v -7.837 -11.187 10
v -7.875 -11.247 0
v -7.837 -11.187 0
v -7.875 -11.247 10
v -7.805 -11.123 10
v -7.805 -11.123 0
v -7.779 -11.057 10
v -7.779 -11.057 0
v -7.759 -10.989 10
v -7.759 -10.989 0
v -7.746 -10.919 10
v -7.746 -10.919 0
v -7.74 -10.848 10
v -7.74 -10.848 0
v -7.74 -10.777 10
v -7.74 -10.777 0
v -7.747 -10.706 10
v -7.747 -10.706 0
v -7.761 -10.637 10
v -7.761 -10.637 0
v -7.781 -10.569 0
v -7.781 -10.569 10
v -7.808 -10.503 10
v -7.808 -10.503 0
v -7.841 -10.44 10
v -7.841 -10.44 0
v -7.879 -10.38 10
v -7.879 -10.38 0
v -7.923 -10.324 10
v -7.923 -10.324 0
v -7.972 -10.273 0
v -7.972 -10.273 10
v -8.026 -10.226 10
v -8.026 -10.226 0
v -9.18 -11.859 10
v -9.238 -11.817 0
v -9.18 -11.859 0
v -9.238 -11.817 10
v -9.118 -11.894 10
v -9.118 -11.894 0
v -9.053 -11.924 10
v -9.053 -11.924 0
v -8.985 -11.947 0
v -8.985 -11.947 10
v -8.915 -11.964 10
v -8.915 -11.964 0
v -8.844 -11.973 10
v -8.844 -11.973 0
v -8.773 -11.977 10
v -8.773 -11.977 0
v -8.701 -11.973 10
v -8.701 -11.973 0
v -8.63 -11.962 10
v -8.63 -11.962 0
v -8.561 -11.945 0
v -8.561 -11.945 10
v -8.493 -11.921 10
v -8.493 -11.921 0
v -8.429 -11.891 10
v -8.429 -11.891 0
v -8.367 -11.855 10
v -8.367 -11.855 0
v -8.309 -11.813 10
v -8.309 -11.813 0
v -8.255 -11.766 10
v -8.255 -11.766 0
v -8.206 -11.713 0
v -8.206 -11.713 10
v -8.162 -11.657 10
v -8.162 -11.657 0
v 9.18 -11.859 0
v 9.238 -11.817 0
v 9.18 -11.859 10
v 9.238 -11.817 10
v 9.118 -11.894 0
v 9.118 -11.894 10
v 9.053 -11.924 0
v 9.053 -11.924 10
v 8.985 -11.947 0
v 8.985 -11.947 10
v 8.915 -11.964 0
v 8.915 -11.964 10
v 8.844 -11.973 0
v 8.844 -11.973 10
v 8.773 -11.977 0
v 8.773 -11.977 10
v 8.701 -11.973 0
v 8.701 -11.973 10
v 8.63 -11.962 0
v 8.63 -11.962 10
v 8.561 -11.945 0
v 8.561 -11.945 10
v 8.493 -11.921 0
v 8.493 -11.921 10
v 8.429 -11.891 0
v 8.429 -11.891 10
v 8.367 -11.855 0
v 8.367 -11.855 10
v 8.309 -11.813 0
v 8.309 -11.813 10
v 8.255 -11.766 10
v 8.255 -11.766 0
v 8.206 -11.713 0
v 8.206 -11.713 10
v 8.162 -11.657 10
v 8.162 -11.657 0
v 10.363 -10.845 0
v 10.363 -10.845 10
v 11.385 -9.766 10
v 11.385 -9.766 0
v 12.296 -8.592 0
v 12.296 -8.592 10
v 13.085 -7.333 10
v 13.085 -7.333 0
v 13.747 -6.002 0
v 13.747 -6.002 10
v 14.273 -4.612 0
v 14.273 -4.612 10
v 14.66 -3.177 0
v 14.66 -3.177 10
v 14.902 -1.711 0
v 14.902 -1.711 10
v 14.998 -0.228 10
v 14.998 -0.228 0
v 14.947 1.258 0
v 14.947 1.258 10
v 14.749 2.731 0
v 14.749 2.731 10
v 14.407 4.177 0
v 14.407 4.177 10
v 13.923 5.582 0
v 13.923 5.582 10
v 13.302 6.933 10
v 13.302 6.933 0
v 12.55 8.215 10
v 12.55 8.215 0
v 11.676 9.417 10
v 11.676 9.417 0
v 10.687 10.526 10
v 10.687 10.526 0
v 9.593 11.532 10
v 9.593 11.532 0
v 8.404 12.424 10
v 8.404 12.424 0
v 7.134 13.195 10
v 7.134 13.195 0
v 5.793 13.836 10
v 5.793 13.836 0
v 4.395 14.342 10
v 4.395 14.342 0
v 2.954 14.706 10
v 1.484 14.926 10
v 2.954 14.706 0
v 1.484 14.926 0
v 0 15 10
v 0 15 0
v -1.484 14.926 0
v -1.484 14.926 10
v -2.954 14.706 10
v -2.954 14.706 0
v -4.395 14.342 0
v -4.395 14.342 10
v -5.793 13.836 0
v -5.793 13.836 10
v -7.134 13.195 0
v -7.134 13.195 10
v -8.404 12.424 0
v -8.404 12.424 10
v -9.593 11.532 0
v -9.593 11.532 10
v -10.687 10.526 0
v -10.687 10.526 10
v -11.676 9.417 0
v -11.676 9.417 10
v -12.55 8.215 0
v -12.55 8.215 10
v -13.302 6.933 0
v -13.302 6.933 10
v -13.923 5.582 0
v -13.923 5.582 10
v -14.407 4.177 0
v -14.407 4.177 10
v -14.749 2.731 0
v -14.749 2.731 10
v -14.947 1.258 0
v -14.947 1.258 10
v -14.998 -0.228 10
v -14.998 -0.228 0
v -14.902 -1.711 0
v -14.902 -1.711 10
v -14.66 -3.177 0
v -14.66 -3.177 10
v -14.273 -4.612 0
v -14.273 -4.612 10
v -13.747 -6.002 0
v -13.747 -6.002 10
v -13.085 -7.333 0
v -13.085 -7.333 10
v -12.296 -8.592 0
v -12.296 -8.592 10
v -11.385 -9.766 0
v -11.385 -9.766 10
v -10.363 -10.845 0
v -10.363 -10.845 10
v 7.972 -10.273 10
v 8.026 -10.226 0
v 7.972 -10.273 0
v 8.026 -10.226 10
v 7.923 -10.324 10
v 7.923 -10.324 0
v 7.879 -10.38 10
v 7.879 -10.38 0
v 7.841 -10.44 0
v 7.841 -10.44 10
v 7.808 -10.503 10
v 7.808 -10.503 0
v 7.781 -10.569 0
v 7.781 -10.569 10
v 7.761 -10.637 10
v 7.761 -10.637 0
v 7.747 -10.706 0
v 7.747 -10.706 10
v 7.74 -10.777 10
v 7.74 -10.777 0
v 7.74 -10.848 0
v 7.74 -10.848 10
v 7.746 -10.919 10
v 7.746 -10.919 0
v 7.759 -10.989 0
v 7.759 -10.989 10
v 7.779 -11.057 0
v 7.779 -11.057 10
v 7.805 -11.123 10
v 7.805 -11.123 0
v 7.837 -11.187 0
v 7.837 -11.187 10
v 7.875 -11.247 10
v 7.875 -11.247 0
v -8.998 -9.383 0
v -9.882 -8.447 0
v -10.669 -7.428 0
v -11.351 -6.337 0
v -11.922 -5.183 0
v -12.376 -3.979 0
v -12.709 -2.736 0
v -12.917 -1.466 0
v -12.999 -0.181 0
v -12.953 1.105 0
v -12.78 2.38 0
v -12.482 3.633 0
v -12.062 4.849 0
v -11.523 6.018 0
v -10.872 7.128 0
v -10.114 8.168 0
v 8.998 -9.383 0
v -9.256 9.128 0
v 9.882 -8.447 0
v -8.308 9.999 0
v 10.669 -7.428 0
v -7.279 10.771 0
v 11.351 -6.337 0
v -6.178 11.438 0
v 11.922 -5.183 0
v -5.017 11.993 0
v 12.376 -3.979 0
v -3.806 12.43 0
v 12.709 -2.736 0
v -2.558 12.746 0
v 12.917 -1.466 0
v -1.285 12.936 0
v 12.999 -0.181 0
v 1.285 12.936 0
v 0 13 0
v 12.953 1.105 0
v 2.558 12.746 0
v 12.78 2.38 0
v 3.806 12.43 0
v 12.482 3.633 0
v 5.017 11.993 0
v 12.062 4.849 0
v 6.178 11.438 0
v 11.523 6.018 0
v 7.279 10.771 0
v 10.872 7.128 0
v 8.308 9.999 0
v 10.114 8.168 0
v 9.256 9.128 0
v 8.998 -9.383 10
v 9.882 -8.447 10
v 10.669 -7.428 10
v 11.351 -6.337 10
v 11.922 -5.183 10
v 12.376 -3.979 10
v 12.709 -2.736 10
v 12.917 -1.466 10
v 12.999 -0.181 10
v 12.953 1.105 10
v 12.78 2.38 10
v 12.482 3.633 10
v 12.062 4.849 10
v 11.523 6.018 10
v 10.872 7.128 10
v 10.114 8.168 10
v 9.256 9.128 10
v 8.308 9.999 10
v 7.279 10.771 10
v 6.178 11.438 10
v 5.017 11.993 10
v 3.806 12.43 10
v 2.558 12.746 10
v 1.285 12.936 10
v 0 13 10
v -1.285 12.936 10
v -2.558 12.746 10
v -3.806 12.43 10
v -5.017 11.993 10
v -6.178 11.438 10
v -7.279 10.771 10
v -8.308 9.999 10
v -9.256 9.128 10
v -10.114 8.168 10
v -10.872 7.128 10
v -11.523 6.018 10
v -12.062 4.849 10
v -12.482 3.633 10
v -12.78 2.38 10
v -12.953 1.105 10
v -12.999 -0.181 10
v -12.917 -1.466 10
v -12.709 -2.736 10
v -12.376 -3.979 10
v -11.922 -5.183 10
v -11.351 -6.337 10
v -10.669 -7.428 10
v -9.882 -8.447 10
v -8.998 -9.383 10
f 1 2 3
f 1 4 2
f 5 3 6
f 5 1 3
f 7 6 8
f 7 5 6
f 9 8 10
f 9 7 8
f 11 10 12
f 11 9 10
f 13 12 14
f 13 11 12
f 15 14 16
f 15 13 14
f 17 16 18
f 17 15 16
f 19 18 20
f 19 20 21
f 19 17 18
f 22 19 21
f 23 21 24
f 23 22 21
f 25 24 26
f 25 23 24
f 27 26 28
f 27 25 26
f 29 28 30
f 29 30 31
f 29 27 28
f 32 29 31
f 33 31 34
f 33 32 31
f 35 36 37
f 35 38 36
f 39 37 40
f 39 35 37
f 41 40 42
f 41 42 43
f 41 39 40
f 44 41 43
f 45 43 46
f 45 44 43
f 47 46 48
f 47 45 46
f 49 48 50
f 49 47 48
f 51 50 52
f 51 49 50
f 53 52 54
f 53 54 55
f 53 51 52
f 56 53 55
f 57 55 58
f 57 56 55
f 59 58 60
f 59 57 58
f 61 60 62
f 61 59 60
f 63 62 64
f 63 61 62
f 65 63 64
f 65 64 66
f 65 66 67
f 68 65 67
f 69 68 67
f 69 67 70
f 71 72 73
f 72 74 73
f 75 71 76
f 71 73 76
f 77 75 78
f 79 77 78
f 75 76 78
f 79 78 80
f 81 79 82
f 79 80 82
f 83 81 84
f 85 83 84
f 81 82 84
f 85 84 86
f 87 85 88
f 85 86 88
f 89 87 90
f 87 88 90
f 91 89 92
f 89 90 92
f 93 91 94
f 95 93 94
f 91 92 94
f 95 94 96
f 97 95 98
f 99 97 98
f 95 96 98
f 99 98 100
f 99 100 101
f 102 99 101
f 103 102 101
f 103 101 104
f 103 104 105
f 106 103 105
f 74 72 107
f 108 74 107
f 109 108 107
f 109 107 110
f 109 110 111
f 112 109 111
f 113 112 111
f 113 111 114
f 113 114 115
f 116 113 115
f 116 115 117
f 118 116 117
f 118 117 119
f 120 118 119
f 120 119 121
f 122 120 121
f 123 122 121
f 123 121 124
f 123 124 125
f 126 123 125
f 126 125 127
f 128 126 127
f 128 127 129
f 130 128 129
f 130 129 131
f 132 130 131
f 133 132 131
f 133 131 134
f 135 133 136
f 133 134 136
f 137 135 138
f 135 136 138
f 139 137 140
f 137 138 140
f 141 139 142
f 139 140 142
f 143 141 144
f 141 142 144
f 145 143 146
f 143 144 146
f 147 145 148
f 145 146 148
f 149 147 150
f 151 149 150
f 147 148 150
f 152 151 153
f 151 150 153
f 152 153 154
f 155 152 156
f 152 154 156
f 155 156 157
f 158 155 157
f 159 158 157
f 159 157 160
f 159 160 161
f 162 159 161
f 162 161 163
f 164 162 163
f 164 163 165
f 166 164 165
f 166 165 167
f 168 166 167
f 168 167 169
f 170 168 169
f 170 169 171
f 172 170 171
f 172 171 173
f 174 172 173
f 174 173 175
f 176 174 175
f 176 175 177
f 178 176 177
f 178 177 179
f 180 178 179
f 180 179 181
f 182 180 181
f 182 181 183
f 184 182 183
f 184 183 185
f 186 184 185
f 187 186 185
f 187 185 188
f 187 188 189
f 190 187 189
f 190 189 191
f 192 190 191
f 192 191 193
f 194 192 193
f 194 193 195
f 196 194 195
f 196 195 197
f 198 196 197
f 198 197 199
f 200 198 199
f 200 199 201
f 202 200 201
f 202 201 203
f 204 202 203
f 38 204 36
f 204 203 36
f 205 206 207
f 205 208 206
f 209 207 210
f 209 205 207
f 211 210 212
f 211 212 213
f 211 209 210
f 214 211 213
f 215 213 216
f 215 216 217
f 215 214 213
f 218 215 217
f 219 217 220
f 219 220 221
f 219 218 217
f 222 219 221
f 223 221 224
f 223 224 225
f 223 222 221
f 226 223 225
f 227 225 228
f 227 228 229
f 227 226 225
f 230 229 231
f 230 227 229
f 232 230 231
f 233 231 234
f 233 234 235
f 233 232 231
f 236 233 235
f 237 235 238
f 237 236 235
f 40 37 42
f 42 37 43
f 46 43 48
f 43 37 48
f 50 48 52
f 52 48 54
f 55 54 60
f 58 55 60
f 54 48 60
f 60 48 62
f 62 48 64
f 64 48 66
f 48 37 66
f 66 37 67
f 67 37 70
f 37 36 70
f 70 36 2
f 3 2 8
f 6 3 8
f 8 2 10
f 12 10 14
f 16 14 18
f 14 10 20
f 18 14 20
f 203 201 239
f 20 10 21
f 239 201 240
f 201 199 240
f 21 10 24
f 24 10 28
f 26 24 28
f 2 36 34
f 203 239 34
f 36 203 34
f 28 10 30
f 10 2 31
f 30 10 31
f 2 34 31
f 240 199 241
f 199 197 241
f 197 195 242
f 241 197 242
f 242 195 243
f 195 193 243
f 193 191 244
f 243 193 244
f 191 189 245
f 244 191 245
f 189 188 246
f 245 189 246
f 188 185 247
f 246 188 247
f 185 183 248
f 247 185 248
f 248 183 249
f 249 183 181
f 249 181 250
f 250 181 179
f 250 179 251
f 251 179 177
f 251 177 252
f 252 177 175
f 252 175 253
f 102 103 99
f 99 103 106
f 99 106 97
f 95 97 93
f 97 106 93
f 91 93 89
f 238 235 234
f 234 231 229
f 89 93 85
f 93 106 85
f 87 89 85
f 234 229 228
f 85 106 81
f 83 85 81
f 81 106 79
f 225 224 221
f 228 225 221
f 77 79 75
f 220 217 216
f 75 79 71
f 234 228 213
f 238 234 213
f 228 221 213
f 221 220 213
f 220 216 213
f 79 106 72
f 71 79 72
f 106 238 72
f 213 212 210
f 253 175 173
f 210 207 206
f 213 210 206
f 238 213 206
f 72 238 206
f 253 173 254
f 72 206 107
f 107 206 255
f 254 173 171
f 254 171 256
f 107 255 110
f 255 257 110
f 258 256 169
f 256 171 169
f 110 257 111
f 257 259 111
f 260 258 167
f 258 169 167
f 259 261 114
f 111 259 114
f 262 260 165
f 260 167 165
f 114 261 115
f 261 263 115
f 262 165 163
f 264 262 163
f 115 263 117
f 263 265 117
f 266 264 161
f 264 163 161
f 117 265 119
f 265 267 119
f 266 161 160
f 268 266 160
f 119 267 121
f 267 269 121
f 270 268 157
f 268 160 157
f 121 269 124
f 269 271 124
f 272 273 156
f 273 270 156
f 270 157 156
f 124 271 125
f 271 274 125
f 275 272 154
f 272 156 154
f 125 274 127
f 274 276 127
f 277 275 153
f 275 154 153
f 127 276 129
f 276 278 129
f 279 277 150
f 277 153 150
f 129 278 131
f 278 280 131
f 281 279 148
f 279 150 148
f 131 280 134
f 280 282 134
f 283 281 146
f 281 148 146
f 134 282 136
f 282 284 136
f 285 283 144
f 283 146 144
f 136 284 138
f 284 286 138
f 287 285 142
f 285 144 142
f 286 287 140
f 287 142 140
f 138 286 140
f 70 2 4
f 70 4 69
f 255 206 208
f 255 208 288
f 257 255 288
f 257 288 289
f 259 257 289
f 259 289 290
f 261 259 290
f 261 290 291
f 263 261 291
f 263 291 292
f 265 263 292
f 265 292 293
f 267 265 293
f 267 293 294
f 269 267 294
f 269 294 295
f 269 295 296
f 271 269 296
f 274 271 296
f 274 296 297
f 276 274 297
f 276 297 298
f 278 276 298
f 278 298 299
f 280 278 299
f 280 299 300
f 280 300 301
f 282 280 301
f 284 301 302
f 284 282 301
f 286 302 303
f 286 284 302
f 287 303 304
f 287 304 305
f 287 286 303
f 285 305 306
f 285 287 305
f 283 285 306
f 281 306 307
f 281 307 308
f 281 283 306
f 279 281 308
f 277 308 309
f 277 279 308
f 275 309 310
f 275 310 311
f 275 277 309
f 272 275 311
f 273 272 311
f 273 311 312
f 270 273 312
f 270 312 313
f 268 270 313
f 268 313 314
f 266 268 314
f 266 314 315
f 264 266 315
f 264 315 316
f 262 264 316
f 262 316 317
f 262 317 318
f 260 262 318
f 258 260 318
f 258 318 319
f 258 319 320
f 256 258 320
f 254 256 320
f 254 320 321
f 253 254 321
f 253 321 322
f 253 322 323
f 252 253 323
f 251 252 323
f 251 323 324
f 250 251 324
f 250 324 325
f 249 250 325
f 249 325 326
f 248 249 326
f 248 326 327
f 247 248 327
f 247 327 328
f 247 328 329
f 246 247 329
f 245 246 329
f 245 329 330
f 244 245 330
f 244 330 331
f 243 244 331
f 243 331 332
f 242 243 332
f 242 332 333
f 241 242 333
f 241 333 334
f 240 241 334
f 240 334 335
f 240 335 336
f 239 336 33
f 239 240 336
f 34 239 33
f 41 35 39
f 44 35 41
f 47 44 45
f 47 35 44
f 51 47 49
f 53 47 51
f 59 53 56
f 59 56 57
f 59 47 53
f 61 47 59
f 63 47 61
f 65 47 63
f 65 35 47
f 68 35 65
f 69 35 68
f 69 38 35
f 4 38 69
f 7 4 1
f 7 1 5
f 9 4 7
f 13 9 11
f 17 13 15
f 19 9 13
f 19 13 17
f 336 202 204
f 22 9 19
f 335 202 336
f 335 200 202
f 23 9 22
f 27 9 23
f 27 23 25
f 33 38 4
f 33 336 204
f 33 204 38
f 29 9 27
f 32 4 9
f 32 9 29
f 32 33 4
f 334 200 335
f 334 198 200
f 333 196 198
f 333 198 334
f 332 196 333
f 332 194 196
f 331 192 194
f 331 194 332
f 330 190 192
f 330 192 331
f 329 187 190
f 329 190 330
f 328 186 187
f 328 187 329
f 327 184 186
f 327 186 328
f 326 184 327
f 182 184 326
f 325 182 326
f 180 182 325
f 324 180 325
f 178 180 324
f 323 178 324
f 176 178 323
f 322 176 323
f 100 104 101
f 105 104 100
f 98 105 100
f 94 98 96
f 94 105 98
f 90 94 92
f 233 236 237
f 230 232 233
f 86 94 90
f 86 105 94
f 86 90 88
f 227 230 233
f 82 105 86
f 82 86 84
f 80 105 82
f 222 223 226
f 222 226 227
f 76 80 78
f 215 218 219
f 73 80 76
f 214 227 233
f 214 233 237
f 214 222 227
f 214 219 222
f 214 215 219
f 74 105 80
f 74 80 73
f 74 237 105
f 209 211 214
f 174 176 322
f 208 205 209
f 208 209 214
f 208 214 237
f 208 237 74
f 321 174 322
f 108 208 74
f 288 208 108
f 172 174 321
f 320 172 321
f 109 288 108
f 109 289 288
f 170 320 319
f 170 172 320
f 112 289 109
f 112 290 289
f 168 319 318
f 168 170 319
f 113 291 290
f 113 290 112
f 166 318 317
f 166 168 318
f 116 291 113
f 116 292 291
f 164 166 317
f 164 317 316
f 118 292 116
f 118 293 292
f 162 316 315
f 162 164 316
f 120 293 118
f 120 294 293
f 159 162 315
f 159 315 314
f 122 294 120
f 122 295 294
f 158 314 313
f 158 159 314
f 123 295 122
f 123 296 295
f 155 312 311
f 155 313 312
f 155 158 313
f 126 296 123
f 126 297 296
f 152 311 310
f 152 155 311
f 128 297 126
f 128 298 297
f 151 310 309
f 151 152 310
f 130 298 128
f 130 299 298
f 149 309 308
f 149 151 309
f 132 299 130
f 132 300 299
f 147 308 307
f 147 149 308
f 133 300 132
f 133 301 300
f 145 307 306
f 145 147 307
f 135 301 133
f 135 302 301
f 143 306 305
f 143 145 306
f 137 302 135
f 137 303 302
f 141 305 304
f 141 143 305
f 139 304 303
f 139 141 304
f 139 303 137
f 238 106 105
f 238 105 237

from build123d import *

# Parameters (mm, degrees)
PAD_DEPTH = 10
FILLET_R  = 0.75


with BuildPart() as part:
    # Sketch → Pad (new body)
    with BuildSketch(Plane.XY):
        with BuildLine():
            ThreePointArc((8.603647, -12.287281), (0, 15), (-8.603647, -12.287281))
            Line((-7.456494, -10.648977), (-8.603647, -12.287281))
            ThreePointArc((7.456494, -10.648977), (0, 13), (-7.456494, -10.648977))
            Line((8.603647, -12.287281), (7.456494, -10.648977))
        make_face()
    extrude(amount=PAD_DEPTH)

    # Fillet
    fillet_edges = [part.edges().sort_by_distance(p)[0] for p in [
        (7.456494, -10.648977, 5),
        (8.603647, -12.287281, 5),
        (-7.456494, -10.648977, 5),
        (-8.603647, -12.287281, 5),
    ]]
    fillet(fillet_edges, radius=FILLET_R)


solid = part.part
